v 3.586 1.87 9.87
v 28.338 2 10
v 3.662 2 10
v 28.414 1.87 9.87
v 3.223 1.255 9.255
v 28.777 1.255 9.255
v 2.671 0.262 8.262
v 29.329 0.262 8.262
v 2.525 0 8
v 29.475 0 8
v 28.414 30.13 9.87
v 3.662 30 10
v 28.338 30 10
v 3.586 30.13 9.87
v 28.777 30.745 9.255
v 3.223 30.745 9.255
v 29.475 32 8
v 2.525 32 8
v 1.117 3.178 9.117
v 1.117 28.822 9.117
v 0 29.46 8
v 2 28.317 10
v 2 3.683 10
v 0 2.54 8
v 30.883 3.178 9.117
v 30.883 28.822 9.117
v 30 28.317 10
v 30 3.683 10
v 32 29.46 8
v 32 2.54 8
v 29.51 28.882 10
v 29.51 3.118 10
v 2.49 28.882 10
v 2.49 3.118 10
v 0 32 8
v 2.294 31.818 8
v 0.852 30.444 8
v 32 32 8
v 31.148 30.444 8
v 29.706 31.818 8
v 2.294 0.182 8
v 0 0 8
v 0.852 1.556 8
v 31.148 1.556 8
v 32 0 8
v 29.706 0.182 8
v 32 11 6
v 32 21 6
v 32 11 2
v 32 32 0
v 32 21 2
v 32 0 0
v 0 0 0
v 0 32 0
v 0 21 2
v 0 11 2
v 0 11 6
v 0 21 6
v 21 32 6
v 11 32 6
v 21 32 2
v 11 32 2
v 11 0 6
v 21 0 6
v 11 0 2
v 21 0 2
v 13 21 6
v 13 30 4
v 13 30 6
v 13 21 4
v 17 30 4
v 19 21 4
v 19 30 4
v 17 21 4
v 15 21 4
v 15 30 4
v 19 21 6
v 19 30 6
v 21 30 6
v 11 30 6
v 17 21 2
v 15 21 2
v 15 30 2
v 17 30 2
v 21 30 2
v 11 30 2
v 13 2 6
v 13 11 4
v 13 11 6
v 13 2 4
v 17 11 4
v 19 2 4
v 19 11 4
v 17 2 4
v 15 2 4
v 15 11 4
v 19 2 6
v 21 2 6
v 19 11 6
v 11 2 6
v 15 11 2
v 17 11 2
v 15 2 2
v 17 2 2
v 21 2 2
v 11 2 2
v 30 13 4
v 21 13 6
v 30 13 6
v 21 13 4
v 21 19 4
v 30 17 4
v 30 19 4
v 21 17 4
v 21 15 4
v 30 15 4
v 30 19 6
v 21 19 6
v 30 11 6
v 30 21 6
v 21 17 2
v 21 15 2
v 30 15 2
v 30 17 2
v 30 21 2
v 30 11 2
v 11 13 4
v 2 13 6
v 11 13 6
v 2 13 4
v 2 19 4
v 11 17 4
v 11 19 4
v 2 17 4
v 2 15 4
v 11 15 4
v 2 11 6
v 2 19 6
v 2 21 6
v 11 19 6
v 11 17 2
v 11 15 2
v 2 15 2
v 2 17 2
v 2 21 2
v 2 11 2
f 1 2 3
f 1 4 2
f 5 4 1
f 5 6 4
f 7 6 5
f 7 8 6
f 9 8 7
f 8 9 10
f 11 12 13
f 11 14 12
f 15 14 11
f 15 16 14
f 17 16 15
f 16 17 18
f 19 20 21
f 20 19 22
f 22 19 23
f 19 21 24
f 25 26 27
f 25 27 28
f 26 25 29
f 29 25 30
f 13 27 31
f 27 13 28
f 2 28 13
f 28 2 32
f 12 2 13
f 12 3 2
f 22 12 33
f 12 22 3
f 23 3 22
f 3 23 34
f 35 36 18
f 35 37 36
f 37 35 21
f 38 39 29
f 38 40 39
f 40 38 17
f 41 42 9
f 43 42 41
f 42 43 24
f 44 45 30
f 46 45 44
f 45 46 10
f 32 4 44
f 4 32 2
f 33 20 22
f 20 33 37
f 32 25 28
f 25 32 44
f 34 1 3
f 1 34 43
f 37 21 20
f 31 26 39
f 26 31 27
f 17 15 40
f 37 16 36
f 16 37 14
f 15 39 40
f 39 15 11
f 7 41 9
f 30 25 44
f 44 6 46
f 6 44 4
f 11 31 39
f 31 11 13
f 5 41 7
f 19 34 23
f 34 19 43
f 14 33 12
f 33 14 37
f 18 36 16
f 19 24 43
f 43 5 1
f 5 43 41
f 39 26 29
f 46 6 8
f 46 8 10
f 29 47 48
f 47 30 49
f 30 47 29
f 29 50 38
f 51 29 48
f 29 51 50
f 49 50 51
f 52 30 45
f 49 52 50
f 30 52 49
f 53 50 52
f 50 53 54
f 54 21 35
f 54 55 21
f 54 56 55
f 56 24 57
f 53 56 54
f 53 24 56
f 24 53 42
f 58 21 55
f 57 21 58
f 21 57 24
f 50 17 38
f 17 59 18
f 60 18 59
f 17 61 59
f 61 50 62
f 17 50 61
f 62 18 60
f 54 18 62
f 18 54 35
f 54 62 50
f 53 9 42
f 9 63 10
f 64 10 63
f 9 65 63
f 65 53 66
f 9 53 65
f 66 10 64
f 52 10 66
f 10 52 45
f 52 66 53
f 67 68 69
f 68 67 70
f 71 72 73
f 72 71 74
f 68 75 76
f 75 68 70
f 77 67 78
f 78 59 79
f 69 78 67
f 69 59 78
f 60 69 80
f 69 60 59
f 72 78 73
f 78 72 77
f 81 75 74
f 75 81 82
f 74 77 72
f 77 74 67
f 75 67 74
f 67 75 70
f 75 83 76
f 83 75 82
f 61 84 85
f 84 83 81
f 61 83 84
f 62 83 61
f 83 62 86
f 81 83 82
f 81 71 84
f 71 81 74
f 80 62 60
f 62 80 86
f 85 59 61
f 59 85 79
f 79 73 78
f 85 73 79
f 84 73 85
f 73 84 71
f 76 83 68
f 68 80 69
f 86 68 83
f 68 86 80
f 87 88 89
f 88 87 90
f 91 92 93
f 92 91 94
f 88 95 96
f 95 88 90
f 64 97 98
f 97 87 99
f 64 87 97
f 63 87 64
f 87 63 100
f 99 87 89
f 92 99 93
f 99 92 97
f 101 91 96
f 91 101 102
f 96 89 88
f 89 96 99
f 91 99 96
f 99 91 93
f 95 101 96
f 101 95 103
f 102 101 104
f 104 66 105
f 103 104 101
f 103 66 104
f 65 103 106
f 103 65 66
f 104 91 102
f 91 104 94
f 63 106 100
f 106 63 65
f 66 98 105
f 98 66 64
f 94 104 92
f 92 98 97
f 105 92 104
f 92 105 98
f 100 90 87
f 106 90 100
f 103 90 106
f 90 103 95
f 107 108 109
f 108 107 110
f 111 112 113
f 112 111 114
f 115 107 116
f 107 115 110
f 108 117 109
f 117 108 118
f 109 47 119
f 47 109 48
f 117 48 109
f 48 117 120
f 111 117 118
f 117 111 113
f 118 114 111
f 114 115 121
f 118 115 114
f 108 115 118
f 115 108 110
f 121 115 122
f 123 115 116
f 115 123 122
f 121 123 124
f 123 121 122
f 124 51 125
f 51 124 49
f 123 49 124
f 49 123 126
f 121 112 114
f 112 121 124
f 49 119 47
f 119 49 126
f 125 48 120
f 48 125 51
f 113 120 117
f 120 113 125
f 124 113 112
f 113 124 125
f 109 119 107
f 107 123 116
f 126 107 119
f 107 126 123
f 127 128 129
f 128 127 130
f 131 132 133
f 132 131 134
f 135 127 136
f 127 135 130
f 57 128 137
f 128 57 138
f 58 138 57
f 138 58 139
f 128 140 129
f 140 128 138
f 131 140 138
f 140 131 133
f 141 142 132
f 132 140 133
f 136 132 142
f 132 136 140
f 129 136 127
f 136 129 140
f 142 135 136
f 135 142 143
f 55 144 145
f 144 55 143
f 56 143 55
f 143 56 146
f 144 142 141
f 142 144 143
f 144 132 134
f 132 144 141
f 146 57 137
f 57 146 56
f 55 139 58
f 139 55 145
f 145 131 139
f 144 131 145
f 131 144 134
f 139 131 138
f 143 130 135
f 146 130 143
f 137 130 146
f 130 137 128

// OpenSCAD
// file: ModularDungeonTileLibrary.scad
//Constants
wallleft = 0;
wallbottom = 1;
wallright = 2;
walltop = 3;
wallcenter = 4;
walldoubleright = 5;


//Variables
size = 32;
connectorlength = size-10;
connectorwidth = 6;
connectorheight = 4;
baseheight = 8;
topperheight = 2;
topperrounded = true;
walllength = size;
wallheight = 25;
wallwidth = 6;
wallwidththin = 4;


//Functions
function hypotenuse_ra(side_a, side_b) =
    sqrt(pow(side_a, 2) + pow(side_b, 2));
    
    
//Modules    
module mtdl_Base_Connector(cw,cl,ch) {
    translate([-connectorwidth/2,-connectorlength/2,-connectorheight/2]) {
        cube([cw,cl,ch/2]);
        translate([cw/3,0,ch/2])
            cube([cw/3,cl,ch/2]);
        translate([-(cw-2)/2,cl/2-2,0])
            cube([cw+4,4,ch]);
    }
}

module mdtl_Base(s,bh)
{
    cube([s,s,bh]);
}

module mdtl_Topper(s,bh,th,tr)
{
    if (tr) {
        translate([0,0,bh])
            intersection() {
                difference () {
                        cube([s,s,th]);
                        union () {
                        rotate(a=45, v=[1,0,0])
                            cube([s,th*2,th*2]);
                        translate([0,s,0])
                            rotate(a=45, v=[1,0,0])
                                cube([s,th*2,th*2]);
                        rotate(a=-45, v=[0,1,0])
                            cube([th*2,s,th*2]);
                        translate([s,0,0])
                            rotate(a=-45, v=[0,1,0])
                                cube([th*2,s,th*2]);
                        }
                }
                translate([s/2,s/2,0])
                    cylinder(
                        h=th, 
                        r1=hypotenuse_ra(s/2-1.2, s/2-1.2), 
                        r2=hypotenuse_ra(s/2-th-.8, s/2-th-.8), 
                        center=false, 
                        $fa=.1);
            }    
    }
    else {
        translate([0,0,bh])
            difference() {
                cube([s,s,th]);
                union () {
                rotate(a=45, v=[1,0,0])
                    cube([s,th*2,th*2]);
                translate([0,s,0])
                    rotate(a=45, v=[1,0,0])
                        cube([s,th*2,th*2]);
                rotate(a=-45, v=[0,1,0])
                    cube([th*2,s,th*2]);
                translate([s,0,0])
                    rotate(a=-45, v=[0,1,0])
                        cube([th*2,s,th*2]);
                }
            }    
    }
}

module mdtl_Base_1x1(s,bh,th,tr) 
{
    difference () {
        union () {
            mdtl_Base(s,bh);
            mdtl_Topper(s,bh,th,tr);
        }
        union () {
            translate([size/2,size,baseheight/2])
                rotate([0,180,0])
                    mtdl_Base_Connector(connectorwidth,connectorlength,connectorheight);
            translate([size/2,0,baseheight/2])
                rotate([0,180,0])
                    mtdl_Base_Connector(connectorwidth,connectorlength,connectorheight);
            translate([size,size/2,baseheight/2])
                rotate([0,180,90])
                    mtdl_Base_Connector(connectorwidth,connectorlength,connectorheight);
            translate([0,size/2,baseheight/2])
                rotate([0,180,90])
                    mtdl_Base_Connector(connectorwidth,connectorlength,connectorheight);
        }
    }
}

module mdtl_Base_1x2(s,bh,th,tr)
{
    union () {
        mdtl_Base_1x1(s,bh,th,tr);
        translate([s,0,0])
            mdtl_Base_1x1(s,bh,th,tr);
    }
}
 
module mdtl_Base_2x2(s,bh,th,tr)
{
    union () {
        mdtl_Base_1x2(s,bh,th,tr);
        translate([0,s,0])
            mdtl_Base_1x2(s,bh,th,tr);
    }
}
 
module mdtl_Base_2x4(s,bh,th,tr)
{
    union () {
        mdtl_Base_2x2(s,bh,th,tr);
        translate([s*2,0,0])
            mdtl_Base_2x2(s,bh,th,tr);
    }
}
 
module mdtl_Base_4x4(s,bh,th,tr)
{
    union () {
        mdtl_Base_2x4(s,bh,th,tr);
        translate([0,s*2,0])
            mdtl_Base_2x4(s,bh,th,tr);
    }
}
 
module mdtl_Wall_1(w,l,h)
{
    translate([0,0,baseheight])
        cube([w,l,h]);   
}

module mdtl_Wall_1_Position(w,l,h,p)
{
    if (p==0) {
        mdtl_Wall_1(w,l,h);
    }
    
    else if (p==1) {
        rotate(a=-90)
           translate([-w,0,0])
               mdtl_Wall_1(w,l,h);       
    }
    
    else if (p==2) {
        translate([(size)-w,0,0])
            mdtl_Wall_1(w,l,h);
    }
    
    else if (p==3) {
        rotate(a=-90)
            translate([-l,0,0])
                mdtl_Wall_1(w,l,h);
    }
    
    else if (p==4) {
        translate([(size)-w/2,0,0])
            mdtl_Wall_1(w,l,h);
    }
    
    else if (p==5) {
        translate([(size*2)-w,0,0])
           mdtl_Wall_1(w,l,h);       
    }
}

module mdtl_Wall_2(w,l,h)
{
    union() {
        mdtl_Wall_1(w,l,h);
        translate([0,l,0])
            mdtl_Wall_1(w,l,h);
    }
}

module mdtl_Wall_2_Position(w,l,h,p)
{
    if (p==0) {
        mdtl_Wall_2(w,l,h);
    }
    
    else if (p==1) {
        rotate(a=-90)
            translate([-w,0,0])
                mdtl_Wall_2(w,l,h);
    }
    
    else if (p==2) {
    translate([(size*2)-w,0,0])
        mdtl_Wall_2(w,l,h);
    }
    
    else if (p==3) {
        rotate(a=-90)
            translate([-l*2,0,0])
                mdtl_Wall_2(w,l,h);
    }
    
    else if (p==4) {
        translate([(size)-w/2,0,0])
            mdtl_Wall_2(w,l,h);
    }
}
// main file
include <ModularDungeonTileLibrary.scad>; 

difference () {
    mdtl_Base_1x1(size,baseheight,topperheight,topperrounded);
}
